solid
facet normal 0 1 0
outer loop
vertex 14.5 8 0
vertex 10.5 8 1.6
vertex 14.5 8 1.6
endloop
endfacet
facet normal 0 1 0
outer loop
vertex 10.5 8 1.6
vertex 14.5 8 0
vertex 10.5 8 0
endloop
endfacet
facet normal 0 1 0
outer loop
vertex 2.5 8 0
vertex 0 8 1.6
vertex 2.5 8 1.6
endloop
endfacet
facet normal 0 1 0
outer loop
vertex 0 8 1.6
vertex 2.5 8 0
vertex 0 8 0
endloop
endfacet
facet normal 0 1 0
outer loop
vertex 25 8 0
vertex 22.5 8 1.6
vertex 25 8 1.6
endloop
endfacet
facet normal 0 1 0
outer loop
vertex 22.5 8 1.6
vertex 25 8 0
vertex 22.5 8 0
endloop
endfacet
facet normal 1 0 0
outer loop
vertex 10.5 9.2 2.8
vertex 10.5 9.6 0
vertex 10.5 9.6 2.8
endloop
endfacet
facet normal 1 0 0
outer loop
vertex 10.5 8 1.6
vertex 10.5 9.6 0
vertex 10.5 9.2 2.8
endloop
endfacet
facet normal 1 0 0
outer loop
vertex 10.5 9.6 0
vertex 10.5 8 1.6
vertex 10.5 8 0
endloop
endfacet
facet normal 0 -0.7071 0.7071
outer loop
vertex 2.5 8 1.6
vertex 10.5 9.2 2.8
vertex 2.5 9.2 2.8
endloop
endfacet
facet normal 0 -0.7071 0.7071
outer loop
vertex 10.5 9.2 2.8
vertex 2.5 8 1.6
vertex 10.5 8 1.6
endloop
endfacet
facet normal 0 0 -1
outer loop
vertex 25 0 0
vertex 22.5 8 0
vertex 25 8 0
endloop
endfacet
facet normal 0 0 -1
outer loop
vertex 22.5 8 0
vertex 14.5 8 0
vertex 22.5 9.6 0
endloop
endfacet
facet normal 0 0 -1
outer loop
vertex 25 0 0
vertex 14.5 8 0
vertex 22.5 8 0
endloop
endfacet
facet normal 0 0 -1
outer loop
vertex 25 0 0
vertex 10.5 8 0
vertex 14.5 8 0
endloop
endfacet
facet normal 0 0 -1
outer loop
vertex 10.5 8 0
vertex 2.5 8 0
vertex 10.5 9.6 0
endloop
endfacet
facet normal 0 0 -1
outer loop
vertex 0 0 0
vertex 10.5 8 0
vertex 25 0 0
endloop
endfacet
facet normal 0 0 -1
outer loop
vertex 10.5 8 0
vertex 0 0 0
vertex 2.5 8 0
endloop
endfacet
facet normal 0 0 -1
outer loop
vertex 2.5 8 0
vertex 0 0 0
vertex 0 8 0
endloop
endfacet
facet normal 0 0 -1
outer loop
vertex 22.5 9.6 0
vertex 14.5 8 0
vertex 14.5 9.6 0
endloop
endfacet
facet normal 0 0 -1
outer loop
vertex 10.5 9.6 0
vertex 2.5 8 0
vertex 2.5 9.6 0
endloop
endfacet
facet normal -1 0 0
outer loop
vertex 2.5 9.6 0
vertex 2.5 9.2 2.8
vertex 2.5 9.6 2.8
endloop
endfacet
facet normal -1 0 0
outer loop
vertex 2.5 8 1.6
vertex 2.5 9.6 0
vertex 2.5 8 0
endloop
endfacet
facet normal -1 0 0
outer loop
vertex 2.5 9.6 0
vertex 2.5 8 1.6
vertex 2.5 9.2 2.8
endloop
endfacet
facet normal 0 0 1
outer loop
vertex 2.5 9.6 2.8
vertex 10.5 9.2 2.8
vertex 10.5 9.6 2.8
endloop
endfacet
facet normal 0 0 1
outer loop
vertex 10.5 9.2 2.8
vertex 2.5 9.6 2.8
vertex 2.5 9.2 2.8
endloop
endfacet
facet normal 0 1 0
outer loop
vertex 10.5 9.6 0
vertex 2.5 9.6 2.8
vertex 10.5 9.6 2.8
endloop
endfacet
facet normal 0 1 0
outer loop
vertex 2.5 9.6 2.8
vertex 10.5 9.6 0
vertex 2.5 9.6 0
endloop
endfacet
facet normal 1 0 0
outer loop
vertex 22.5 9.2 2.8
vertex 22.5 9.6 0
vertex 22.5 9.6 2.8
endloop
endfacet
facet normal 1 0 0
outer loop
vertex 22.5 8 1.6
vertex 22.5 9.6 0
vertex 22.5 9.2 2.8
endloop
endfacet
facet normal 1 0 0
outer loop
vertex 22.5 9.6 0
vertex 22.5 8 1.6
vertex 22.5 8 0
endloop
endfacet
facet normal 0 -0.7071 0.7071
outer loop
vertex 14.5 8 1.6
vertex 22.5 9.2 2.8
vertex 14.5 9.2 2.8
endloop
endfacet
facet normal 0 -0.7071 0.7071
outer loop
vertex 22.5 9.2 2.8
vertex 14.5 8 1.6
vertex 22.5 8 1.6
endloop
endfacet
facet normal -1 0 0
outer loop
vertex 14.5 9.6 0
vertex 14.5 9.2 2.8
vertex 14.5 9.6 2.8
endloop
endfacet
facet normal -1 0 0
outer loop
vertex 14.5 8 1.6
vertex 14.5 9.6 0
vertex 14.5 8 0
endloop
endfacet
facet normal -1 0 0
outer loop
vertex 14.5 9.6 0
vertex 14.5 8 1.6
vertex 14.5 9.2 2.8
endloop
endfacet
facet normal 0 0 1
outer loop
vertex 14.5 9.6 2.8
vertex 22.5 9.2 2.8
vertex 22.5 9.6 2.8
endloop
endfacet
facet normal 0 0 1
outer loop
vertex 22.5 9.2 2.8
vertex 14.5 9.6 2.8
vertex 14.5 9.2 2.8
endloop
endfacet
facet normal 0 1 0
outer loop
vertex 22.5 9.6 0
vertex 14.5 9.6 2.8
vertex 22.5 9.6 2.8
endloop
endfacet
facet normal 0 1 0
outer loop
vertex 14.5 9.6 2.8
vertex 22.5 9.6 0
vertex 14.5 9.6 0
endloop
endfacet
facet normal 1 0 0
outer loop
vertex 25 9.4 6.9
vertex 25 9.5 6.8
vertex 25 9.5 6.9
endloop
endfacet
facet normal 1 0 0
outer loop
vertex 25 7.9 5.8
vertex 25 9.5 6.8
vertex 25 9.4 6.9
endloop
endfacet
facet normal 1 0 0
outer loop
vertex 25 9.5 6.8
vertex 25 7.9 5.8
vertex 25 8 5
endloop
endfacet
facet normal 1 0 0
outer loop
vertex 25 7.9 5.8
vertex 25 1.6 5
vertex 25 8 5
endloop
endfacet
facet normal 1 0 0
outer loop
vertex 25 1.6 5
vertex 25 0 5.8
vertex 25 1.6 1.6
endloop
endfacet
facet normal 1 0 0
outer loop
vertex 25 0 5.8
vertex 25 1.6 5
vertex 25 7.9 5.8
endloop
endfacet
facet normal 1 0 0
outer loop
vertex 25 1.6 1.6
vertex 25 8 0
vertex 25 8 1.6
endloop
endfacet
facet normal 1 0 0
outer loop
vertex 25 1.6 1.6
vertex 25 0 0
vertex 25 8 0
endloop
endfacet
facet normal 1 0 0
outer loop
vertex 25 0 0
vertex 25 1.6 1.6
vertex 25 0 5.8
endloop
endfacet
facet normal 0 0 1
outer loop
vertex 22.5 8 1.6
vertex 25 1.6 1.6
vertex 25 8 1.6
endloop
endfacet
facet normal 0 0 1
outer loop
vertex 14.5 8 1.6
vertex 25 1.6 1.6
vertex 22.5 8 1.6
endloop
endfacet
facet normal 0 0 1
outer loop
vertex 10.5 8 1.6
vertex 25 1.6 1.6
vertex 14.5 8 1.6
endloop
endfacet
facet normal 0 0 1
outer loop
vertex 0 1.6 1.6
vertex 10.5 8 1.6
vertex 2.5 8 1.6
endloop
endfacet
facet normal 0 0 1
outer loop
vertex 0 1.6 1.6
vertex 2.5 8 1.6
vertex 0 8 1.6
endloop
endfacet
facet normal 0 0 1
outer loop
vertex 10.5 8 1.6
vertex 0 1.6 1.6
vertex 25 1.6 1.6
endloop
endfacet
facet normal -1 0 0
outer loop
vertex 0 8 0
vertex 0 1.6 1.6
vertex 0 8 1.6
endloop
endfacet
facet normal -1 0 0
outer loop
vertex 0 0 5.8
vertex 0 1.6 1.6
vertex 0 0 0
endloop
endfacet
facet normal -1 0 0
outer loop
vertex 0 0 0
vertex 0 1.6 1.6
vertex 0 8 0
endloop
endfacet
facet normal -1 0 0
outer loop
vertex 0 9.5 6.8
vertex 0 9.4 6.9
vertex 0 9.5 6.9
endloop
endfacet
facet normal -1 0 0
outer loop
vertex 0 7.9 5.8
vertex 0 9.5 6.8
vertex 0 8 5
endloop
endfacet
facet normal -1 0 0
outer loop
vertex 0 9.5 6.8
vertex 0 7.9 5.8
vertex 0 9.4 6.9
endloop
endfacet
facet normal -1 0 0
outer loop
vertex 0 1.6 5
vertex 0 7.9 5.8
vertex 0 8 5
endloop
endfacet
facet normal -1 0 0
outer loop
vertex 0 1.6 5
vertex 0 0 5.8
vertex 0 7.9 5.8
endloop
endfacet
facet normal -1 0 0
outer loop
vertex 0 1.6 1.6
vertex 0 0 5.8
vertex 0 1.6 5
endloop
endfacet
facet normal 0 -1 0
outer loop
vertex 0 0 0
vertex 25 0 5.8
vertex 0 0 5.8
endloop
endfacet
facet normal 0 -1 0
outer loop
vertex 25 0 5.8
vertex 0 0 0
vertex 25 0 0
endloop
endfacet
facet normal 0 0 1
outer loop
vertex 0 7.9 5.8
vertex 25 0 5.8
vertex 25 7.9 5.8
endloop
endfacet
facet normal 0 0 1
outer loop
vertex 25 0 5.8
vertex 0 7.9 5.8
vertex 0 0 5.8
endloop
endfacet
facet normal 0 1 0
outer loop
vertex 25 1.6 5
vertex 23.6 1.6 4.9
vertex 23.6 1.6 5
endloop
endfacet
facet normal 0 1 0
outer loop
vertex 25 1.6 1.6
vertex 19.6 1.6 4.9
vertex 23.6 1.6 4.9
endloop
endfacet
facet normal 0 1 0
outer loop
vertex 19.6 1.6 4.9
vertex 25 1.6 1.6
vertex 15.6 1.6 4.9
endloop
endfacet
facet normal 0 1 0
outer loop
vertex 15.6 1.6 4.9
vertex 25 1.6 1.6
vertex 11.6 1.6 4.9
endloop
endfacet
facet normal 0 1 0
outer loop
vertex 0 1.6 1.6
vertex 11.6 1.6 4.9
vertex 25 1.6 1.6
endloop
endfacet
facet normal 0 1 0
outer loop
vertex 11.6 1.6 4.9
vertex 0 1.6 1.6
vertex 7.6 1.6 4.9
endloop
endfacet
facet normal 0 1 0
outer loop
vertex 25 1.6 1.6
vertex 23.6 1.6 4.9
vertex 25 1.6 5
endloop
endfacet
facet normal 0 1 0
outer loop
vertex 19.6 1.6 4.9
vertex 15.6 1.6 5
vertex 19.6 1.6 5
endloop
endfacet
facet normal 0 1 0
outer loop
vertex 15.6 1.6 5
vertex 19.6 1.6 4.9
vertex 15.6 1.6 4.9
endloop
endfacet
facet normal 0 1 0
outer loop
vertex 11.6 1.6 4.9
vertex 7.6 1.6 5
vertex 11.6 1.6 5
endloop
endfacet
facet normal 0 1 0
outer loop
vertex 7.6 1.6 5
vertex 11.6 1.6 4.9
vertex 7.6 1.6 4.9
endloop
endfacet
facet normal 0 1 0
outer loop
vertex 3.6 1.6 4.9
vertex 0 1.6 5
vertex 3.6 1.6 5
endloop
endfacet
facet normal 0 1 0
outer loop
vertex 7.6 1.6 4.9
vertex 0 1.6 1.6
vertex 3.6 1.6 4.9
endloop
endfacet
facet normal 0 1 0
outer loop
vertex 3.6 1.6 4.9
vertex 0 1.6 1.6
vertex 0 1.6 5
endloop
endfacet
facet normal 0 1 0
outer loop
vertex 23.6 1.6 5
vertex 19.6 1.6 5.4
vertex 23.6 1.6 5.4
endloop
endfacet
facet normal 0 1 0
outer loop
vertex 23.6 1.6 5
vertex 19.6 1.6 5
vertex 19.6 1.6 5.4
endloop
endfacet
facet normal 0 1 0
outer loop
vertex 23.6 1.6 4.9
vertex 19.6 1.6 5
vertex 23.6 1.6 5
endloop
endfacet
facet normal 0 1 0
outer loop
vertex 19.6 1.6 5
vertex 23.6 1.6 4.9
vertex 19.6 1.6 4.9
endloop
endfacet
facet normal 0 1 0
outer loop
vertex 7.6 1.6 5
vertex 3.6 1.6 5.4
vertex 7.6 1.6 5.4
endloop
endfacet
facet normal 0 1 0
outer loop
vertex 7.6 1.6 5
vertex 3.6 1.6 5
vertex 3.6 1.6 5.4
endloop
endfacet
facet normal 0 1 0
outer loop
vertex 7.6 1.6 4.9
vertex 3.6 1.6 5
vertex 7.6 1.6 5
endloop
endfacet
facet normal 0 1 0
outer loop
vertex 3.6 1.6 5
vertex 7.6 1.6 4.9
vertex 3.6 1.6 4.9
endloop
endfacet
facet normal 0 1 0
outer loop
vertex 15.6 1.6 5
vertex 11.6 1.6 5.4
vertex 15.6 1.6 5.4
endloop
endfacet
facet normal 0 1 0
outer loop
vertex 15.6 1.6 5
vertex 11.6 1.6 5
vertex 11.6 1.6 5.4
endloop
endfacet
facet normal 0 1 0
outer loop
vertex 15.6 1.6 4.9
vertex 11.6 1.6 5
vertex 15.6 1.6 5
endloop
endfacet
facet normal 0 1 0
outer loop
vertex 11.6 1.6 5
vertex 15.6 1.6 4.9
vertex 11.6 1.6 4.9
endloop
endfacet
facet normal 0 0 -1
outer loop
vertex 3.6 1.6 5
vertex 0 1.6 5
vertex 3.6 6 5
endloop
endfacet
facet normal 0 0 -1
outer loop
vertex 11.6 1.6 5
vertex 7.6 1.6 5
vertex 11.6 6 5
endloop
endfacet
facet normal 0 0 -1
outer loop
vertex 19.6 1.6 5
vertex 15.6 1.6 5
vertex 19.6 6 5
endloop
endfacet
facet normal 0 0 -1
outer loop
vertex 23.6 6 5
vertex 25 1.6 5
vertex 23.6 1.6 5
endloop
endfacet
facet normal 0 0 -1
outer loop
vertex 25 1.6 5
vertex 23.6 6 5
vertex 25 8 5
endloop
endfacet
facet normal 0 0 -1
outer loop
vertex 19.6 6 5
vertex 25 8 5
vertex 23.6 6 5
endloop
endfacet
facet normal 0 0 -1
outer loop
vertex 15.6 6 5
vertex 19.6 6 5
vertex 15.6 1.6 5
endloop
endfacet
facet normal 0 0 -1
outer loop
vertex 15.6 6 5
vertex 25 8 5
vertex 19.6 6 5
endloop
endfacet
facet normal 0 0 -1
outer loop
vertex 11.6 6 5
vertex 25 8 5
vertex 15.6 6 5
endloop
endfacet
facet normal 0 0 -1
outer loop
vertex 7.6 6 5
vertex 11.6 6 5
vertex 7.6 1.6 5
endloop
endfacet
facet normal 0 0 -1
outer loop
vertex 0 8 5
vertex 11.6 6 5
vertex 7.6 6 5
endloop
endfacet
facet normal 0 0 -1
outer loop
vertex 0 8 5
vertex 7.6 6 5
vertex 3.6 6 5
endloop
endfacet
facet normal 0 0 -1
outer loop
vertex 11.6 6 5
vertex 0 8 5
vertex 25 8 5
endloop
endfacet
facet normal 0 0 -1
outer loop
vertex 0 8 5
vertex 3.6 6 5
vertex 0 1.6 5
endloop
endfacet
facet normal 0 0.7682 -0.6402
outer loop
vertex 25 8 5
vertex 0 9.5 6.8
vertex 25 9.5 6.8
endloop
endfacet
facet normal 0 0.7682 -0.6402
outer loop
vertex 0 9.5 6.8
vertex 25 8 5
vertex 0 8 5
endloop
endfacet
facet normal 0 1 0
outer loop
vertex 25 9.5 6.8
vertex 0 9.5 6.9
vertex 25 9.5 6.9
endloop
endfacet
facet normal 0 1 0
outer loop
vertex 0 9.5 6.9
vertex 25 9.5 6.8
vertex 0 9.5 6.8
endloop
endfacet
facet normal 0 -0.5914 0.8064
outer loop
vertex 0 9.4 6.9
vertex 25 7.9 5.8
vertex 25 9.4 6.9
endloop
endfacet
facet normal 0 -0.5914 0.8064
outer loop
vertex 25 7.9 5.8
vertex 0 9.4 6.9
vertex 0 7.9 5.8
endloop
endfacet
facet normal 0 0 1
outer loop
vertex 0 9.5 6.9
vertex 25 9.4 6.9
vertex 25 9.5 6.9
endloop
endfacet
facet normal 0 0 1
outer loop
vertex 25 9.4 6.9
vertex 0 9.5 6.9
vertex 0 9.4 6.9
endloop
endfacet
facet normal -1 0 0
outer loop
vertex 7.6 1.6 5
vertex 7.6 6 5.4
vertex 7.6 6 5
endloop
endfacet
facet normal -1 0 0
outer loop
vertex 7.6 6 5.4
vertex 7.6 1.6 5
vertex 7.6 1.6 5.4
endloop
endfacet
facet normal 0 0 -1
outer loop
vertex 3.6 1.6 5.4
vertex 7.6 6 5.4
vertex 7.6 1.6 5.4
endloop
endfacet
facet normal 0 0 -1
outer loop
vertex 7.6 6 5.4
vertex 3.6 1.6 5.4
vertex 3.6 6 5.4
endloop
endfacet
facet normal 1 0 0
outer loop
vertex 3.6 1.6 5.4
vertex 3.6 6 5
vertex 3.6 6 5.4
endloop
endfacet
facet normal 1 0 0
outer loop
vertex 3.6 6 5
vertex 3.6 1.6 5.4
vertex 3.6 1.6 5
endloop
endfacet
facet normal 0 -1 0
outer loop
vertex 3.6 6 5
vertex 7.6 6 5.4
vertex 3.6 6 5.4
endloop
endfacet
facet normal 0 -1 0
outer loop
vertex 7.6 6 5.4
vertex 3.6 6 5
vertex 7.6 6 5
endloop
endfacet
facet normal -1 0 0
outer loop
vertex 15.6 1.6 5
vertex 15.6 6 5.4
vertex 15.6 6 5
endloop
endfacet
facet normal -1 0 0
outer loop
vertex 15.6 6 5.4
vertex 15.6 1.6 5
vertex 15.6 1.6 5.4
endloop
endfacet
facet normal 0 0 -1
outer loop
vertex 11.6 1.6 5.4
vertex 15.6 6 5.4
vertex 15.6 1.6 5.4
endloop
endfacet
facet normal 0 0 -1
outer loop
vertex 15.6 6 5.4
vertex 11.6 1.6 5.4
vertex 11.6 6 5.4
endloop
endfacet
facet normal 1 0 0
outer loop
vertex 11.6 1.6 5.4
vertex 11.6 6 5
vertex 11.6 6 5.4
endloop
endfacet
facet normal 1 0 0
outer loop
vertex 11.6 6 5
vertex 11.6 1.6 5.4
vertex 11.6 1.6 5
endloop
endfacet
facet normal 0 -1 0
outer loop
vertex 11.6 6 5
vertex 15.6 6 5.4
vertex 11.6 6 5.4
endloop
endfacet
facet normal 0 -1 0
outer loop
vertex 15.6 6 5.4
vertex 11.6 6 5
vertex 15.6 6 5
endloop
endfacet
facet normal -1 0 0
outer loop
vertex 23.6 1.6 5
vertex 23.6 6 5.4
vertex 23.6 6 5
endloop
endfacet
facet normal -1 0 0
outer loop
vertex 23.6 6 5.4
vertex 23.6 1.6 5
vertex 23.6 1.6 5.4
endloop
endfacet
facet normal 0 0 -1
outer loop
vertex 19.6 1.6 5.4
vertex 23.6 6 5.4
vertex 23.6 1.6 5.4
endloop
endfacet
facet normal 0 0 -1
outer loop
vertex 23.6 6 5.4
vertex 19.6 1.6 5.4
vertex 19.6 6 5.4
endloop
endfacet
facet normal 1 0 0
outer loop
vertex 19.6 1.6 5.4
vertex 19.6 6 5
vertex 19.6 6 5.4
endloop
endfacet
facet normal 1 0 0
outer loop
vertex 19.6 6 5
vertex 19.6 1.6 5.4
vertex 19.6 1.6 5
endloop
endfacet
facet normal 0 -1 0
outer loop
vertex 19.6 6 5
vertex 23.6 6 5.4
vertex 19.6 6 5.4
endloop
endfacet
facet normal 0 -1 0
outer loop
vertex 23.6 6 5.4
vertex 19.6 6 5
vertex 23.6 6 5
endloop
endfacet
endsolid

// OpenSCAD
// ============================================================
// CLIP RETENTOR PARA FILTRO DE CABINE GM BOSCH
// Impressão 3D - PLA/PETG (Ender 3)
// ============================================================
//
// CONCEITO: Retentores leves para filtro de cabine automotivo.
// O filtro é de PAPEL com moldura fina de papelão (~1-2mm esp),
// muito leve (~100g). Não precisa de muita força de retenção.
//
// O clip é um retentor de pressão: encaixa no MDF pelo lado
// de trás (snap-fit nos slots), e tem uma aba flexível fina
// que faz pressão suave sobre a borda do filtro.
//
// FILTRO DE CABINE GM BOSCH:
//   Externo: ~223×210mm
//   Moldura: ~5mm de borda, ~1-2mm espessura (papelão fino)
//   Espessura: 20mm (corpo plissado)
//   Furo MDF: 213×200mm (borda de 5mm repousa no MDF)
//
// FIXAÇÃO: 2 dentes snap-fit por clip, passam por slots
// cortados no MDF a 8mm da borda do furo.
//
// QUANTIDADE: 8 clips (2 por lado do furo)
//
// VISTA LATERAL (corte):
//
//   ╭── aba flexível (pressão leve) ──╮
//   │   borda filtro (~1-2mm papel)   │
//   ╞═══MDF══[entalhe]════════════════╡  ← entalhe 25×2mm no MDF
//            │  base (sob o MDF)       │
//            └── dente ────── dente ───┘
//
// MONTAGEM:
//   1. Incline o clip pela abertura do furo
//   2. Deslize a base por baixo do MDF (área sólida)
//   3. A parede passa pelo entalhe 25×2mm na borda
//   4. Dentes clicam nos slots do MDF
//   5. Aba faz pressão suave sobre a borda do filtro
//
// DIFERENÇA DOS OUTROS CLIPS:
//   - Aba muito fina (0.8mm) e flexível — apenas pressão leve
//   - Aba mais longa (8mm) para distribuir a força
//   - Sem rampa agressiva — filtro é mole, encaixa fácil
//   - Clip menor e mais leve (25mm largura)
//   - Ponta da aba curvada para cima — facilita inserção
//
// ============================================================

// === PARÂMETROS ===
mdf = 3;              // Espessura MDF
folga = 0.3;          // Folga de encaixe

// Filtro cabine
filtro_borda_esp = 2; // Espessura da moldura (papelão fino)
filtro_borda_larg = 5;// Largura da borda

// Clip
clip_larg = 25;       // Largura do clip ao longo da borda
clip_parede = 1.6;    // Espessura paredes (mais fino, filtro leve)
aba_comp = 8;         // Comprimento aba (5mm borda + 3mm cobertura)
aba_esp = 0.8;        // Espessura aba (BEM fina, só pressão leve)
base_prof = 8;        // Profundidade base por baixo do MDF

// Snap-fit
dente_h = 1.2;        // Altura do dente
dente_w = 8;          // Largura do dente
dente_pos1 = 6;       // Posição dente 1 (do centro)
dente_pos2 = 6;       // Simétrico

// Slot no MDF
slot_w = 10;          // Largura do slot
slot_h = 2;           // Altura do slot

// Entalhe no MDF para parede do clip (CNC)
entalhe_w    = clip_larg;   // 25mm (largura do clip)
entalhe_prof = clip_parede; // 1.6mm (~2mm no CNC)

// === MÓDULO PRINCIPAL ===
module clip_gm_cabine() {
    // X = largura (25mm ao longo da borda)
    // Y = profundidade (base → aba)
    // Z = altura (de baixo do MDF para cima)
    //
    // Z=0 = face inferior do MDF
    // Z=mdf = face superior do MDF
    // Z=mdf+filtro_borda_esp = topo da moldura do filtro

    difference() {
        union() {
            // --- BASE (por baixo do MDF) ---
            cube([clip_larg, base_prof, clip_parede]);

            // --- PAREDE VERTICAL (borda do furo) ---
            cube([clip_larg, clip_parede, mdf + filtro_borda_esp + aba_esp]);

            // --- ABA FLEXÍVEL (sobre borda do filtro) ---
            // Fina (0.8mm) para fazer pressão suave
            // Mais longa (8mm) para segurar bem a borda mole
            translate([0, 0, mdf + filtro_borda_esp])
                cube([clip_larg, aba_comp, aba_esp]);

            // --- PONTA CURVADA (facilita inserção) ---
            // Levanta a ponta da aba para o filtro deslizar por baixo
            translate([0, aba_comp - 0.1, mdf + filtro_borda_esp])
            hull() {
                cube([clip_larg, 0.1, aba_esp]);
                translate([0, 1.5, aba_esp + 1])
                    cube([clip_larg, 0.1, 0.1]);
            }

            // --- DENTES SNAP-FIT (2 por clip) ---
            translate([clip_larg/2 - dente_pos1 - dente_w/2, base_prof, 0])
                dente_snap();
            translate([clip_larg/2 + dente_pos2 - dente_w/2, base_prof, 0])
                dente_snap();
        }

        // --- RANHURAS de flexão na aba ---
        // 3 ranhuras longitudinais tornam a aba mais flexível
        // Fundamental para não amassar o filtro de papel!
        for (i = [0:2]) {
            translate([clip_parede + 2 + i * 8, clip_parede, mdf + filtro_borda_esp - 0.1])
                cube([4, aba_comp - clip_parede - 2, 0.5]);
        }
    }
}

// Dente snap-fit
module dente_snap() {
    hull() {
        cube([dente_w, 0.1, clip_parede]);
        translate([0, dente_h, 0])
            cube([dente_w, 0.1, clip_parede + dente_h]);
    }
    translate([0, dente_h, 0])
        cube([dente_w, 0.4, clip_parede + dente_h]);
}

// === VISUALIZAÇÃO ===

// Clip para impressão
clip_gm_cabine();

// MDF fantasma
%translate([-5, -2, 0])
    cube([clip_larg + 10, base_prof + aba_comp + 10, mdf]);

// Filtro cabine fantasma (borda fina)
%translate([0, 0, mdf])
    color("WhiteSmoke", 0.4)
        cube([clip_larg, filtro_borda_larg, filtro_borda_esp]);
